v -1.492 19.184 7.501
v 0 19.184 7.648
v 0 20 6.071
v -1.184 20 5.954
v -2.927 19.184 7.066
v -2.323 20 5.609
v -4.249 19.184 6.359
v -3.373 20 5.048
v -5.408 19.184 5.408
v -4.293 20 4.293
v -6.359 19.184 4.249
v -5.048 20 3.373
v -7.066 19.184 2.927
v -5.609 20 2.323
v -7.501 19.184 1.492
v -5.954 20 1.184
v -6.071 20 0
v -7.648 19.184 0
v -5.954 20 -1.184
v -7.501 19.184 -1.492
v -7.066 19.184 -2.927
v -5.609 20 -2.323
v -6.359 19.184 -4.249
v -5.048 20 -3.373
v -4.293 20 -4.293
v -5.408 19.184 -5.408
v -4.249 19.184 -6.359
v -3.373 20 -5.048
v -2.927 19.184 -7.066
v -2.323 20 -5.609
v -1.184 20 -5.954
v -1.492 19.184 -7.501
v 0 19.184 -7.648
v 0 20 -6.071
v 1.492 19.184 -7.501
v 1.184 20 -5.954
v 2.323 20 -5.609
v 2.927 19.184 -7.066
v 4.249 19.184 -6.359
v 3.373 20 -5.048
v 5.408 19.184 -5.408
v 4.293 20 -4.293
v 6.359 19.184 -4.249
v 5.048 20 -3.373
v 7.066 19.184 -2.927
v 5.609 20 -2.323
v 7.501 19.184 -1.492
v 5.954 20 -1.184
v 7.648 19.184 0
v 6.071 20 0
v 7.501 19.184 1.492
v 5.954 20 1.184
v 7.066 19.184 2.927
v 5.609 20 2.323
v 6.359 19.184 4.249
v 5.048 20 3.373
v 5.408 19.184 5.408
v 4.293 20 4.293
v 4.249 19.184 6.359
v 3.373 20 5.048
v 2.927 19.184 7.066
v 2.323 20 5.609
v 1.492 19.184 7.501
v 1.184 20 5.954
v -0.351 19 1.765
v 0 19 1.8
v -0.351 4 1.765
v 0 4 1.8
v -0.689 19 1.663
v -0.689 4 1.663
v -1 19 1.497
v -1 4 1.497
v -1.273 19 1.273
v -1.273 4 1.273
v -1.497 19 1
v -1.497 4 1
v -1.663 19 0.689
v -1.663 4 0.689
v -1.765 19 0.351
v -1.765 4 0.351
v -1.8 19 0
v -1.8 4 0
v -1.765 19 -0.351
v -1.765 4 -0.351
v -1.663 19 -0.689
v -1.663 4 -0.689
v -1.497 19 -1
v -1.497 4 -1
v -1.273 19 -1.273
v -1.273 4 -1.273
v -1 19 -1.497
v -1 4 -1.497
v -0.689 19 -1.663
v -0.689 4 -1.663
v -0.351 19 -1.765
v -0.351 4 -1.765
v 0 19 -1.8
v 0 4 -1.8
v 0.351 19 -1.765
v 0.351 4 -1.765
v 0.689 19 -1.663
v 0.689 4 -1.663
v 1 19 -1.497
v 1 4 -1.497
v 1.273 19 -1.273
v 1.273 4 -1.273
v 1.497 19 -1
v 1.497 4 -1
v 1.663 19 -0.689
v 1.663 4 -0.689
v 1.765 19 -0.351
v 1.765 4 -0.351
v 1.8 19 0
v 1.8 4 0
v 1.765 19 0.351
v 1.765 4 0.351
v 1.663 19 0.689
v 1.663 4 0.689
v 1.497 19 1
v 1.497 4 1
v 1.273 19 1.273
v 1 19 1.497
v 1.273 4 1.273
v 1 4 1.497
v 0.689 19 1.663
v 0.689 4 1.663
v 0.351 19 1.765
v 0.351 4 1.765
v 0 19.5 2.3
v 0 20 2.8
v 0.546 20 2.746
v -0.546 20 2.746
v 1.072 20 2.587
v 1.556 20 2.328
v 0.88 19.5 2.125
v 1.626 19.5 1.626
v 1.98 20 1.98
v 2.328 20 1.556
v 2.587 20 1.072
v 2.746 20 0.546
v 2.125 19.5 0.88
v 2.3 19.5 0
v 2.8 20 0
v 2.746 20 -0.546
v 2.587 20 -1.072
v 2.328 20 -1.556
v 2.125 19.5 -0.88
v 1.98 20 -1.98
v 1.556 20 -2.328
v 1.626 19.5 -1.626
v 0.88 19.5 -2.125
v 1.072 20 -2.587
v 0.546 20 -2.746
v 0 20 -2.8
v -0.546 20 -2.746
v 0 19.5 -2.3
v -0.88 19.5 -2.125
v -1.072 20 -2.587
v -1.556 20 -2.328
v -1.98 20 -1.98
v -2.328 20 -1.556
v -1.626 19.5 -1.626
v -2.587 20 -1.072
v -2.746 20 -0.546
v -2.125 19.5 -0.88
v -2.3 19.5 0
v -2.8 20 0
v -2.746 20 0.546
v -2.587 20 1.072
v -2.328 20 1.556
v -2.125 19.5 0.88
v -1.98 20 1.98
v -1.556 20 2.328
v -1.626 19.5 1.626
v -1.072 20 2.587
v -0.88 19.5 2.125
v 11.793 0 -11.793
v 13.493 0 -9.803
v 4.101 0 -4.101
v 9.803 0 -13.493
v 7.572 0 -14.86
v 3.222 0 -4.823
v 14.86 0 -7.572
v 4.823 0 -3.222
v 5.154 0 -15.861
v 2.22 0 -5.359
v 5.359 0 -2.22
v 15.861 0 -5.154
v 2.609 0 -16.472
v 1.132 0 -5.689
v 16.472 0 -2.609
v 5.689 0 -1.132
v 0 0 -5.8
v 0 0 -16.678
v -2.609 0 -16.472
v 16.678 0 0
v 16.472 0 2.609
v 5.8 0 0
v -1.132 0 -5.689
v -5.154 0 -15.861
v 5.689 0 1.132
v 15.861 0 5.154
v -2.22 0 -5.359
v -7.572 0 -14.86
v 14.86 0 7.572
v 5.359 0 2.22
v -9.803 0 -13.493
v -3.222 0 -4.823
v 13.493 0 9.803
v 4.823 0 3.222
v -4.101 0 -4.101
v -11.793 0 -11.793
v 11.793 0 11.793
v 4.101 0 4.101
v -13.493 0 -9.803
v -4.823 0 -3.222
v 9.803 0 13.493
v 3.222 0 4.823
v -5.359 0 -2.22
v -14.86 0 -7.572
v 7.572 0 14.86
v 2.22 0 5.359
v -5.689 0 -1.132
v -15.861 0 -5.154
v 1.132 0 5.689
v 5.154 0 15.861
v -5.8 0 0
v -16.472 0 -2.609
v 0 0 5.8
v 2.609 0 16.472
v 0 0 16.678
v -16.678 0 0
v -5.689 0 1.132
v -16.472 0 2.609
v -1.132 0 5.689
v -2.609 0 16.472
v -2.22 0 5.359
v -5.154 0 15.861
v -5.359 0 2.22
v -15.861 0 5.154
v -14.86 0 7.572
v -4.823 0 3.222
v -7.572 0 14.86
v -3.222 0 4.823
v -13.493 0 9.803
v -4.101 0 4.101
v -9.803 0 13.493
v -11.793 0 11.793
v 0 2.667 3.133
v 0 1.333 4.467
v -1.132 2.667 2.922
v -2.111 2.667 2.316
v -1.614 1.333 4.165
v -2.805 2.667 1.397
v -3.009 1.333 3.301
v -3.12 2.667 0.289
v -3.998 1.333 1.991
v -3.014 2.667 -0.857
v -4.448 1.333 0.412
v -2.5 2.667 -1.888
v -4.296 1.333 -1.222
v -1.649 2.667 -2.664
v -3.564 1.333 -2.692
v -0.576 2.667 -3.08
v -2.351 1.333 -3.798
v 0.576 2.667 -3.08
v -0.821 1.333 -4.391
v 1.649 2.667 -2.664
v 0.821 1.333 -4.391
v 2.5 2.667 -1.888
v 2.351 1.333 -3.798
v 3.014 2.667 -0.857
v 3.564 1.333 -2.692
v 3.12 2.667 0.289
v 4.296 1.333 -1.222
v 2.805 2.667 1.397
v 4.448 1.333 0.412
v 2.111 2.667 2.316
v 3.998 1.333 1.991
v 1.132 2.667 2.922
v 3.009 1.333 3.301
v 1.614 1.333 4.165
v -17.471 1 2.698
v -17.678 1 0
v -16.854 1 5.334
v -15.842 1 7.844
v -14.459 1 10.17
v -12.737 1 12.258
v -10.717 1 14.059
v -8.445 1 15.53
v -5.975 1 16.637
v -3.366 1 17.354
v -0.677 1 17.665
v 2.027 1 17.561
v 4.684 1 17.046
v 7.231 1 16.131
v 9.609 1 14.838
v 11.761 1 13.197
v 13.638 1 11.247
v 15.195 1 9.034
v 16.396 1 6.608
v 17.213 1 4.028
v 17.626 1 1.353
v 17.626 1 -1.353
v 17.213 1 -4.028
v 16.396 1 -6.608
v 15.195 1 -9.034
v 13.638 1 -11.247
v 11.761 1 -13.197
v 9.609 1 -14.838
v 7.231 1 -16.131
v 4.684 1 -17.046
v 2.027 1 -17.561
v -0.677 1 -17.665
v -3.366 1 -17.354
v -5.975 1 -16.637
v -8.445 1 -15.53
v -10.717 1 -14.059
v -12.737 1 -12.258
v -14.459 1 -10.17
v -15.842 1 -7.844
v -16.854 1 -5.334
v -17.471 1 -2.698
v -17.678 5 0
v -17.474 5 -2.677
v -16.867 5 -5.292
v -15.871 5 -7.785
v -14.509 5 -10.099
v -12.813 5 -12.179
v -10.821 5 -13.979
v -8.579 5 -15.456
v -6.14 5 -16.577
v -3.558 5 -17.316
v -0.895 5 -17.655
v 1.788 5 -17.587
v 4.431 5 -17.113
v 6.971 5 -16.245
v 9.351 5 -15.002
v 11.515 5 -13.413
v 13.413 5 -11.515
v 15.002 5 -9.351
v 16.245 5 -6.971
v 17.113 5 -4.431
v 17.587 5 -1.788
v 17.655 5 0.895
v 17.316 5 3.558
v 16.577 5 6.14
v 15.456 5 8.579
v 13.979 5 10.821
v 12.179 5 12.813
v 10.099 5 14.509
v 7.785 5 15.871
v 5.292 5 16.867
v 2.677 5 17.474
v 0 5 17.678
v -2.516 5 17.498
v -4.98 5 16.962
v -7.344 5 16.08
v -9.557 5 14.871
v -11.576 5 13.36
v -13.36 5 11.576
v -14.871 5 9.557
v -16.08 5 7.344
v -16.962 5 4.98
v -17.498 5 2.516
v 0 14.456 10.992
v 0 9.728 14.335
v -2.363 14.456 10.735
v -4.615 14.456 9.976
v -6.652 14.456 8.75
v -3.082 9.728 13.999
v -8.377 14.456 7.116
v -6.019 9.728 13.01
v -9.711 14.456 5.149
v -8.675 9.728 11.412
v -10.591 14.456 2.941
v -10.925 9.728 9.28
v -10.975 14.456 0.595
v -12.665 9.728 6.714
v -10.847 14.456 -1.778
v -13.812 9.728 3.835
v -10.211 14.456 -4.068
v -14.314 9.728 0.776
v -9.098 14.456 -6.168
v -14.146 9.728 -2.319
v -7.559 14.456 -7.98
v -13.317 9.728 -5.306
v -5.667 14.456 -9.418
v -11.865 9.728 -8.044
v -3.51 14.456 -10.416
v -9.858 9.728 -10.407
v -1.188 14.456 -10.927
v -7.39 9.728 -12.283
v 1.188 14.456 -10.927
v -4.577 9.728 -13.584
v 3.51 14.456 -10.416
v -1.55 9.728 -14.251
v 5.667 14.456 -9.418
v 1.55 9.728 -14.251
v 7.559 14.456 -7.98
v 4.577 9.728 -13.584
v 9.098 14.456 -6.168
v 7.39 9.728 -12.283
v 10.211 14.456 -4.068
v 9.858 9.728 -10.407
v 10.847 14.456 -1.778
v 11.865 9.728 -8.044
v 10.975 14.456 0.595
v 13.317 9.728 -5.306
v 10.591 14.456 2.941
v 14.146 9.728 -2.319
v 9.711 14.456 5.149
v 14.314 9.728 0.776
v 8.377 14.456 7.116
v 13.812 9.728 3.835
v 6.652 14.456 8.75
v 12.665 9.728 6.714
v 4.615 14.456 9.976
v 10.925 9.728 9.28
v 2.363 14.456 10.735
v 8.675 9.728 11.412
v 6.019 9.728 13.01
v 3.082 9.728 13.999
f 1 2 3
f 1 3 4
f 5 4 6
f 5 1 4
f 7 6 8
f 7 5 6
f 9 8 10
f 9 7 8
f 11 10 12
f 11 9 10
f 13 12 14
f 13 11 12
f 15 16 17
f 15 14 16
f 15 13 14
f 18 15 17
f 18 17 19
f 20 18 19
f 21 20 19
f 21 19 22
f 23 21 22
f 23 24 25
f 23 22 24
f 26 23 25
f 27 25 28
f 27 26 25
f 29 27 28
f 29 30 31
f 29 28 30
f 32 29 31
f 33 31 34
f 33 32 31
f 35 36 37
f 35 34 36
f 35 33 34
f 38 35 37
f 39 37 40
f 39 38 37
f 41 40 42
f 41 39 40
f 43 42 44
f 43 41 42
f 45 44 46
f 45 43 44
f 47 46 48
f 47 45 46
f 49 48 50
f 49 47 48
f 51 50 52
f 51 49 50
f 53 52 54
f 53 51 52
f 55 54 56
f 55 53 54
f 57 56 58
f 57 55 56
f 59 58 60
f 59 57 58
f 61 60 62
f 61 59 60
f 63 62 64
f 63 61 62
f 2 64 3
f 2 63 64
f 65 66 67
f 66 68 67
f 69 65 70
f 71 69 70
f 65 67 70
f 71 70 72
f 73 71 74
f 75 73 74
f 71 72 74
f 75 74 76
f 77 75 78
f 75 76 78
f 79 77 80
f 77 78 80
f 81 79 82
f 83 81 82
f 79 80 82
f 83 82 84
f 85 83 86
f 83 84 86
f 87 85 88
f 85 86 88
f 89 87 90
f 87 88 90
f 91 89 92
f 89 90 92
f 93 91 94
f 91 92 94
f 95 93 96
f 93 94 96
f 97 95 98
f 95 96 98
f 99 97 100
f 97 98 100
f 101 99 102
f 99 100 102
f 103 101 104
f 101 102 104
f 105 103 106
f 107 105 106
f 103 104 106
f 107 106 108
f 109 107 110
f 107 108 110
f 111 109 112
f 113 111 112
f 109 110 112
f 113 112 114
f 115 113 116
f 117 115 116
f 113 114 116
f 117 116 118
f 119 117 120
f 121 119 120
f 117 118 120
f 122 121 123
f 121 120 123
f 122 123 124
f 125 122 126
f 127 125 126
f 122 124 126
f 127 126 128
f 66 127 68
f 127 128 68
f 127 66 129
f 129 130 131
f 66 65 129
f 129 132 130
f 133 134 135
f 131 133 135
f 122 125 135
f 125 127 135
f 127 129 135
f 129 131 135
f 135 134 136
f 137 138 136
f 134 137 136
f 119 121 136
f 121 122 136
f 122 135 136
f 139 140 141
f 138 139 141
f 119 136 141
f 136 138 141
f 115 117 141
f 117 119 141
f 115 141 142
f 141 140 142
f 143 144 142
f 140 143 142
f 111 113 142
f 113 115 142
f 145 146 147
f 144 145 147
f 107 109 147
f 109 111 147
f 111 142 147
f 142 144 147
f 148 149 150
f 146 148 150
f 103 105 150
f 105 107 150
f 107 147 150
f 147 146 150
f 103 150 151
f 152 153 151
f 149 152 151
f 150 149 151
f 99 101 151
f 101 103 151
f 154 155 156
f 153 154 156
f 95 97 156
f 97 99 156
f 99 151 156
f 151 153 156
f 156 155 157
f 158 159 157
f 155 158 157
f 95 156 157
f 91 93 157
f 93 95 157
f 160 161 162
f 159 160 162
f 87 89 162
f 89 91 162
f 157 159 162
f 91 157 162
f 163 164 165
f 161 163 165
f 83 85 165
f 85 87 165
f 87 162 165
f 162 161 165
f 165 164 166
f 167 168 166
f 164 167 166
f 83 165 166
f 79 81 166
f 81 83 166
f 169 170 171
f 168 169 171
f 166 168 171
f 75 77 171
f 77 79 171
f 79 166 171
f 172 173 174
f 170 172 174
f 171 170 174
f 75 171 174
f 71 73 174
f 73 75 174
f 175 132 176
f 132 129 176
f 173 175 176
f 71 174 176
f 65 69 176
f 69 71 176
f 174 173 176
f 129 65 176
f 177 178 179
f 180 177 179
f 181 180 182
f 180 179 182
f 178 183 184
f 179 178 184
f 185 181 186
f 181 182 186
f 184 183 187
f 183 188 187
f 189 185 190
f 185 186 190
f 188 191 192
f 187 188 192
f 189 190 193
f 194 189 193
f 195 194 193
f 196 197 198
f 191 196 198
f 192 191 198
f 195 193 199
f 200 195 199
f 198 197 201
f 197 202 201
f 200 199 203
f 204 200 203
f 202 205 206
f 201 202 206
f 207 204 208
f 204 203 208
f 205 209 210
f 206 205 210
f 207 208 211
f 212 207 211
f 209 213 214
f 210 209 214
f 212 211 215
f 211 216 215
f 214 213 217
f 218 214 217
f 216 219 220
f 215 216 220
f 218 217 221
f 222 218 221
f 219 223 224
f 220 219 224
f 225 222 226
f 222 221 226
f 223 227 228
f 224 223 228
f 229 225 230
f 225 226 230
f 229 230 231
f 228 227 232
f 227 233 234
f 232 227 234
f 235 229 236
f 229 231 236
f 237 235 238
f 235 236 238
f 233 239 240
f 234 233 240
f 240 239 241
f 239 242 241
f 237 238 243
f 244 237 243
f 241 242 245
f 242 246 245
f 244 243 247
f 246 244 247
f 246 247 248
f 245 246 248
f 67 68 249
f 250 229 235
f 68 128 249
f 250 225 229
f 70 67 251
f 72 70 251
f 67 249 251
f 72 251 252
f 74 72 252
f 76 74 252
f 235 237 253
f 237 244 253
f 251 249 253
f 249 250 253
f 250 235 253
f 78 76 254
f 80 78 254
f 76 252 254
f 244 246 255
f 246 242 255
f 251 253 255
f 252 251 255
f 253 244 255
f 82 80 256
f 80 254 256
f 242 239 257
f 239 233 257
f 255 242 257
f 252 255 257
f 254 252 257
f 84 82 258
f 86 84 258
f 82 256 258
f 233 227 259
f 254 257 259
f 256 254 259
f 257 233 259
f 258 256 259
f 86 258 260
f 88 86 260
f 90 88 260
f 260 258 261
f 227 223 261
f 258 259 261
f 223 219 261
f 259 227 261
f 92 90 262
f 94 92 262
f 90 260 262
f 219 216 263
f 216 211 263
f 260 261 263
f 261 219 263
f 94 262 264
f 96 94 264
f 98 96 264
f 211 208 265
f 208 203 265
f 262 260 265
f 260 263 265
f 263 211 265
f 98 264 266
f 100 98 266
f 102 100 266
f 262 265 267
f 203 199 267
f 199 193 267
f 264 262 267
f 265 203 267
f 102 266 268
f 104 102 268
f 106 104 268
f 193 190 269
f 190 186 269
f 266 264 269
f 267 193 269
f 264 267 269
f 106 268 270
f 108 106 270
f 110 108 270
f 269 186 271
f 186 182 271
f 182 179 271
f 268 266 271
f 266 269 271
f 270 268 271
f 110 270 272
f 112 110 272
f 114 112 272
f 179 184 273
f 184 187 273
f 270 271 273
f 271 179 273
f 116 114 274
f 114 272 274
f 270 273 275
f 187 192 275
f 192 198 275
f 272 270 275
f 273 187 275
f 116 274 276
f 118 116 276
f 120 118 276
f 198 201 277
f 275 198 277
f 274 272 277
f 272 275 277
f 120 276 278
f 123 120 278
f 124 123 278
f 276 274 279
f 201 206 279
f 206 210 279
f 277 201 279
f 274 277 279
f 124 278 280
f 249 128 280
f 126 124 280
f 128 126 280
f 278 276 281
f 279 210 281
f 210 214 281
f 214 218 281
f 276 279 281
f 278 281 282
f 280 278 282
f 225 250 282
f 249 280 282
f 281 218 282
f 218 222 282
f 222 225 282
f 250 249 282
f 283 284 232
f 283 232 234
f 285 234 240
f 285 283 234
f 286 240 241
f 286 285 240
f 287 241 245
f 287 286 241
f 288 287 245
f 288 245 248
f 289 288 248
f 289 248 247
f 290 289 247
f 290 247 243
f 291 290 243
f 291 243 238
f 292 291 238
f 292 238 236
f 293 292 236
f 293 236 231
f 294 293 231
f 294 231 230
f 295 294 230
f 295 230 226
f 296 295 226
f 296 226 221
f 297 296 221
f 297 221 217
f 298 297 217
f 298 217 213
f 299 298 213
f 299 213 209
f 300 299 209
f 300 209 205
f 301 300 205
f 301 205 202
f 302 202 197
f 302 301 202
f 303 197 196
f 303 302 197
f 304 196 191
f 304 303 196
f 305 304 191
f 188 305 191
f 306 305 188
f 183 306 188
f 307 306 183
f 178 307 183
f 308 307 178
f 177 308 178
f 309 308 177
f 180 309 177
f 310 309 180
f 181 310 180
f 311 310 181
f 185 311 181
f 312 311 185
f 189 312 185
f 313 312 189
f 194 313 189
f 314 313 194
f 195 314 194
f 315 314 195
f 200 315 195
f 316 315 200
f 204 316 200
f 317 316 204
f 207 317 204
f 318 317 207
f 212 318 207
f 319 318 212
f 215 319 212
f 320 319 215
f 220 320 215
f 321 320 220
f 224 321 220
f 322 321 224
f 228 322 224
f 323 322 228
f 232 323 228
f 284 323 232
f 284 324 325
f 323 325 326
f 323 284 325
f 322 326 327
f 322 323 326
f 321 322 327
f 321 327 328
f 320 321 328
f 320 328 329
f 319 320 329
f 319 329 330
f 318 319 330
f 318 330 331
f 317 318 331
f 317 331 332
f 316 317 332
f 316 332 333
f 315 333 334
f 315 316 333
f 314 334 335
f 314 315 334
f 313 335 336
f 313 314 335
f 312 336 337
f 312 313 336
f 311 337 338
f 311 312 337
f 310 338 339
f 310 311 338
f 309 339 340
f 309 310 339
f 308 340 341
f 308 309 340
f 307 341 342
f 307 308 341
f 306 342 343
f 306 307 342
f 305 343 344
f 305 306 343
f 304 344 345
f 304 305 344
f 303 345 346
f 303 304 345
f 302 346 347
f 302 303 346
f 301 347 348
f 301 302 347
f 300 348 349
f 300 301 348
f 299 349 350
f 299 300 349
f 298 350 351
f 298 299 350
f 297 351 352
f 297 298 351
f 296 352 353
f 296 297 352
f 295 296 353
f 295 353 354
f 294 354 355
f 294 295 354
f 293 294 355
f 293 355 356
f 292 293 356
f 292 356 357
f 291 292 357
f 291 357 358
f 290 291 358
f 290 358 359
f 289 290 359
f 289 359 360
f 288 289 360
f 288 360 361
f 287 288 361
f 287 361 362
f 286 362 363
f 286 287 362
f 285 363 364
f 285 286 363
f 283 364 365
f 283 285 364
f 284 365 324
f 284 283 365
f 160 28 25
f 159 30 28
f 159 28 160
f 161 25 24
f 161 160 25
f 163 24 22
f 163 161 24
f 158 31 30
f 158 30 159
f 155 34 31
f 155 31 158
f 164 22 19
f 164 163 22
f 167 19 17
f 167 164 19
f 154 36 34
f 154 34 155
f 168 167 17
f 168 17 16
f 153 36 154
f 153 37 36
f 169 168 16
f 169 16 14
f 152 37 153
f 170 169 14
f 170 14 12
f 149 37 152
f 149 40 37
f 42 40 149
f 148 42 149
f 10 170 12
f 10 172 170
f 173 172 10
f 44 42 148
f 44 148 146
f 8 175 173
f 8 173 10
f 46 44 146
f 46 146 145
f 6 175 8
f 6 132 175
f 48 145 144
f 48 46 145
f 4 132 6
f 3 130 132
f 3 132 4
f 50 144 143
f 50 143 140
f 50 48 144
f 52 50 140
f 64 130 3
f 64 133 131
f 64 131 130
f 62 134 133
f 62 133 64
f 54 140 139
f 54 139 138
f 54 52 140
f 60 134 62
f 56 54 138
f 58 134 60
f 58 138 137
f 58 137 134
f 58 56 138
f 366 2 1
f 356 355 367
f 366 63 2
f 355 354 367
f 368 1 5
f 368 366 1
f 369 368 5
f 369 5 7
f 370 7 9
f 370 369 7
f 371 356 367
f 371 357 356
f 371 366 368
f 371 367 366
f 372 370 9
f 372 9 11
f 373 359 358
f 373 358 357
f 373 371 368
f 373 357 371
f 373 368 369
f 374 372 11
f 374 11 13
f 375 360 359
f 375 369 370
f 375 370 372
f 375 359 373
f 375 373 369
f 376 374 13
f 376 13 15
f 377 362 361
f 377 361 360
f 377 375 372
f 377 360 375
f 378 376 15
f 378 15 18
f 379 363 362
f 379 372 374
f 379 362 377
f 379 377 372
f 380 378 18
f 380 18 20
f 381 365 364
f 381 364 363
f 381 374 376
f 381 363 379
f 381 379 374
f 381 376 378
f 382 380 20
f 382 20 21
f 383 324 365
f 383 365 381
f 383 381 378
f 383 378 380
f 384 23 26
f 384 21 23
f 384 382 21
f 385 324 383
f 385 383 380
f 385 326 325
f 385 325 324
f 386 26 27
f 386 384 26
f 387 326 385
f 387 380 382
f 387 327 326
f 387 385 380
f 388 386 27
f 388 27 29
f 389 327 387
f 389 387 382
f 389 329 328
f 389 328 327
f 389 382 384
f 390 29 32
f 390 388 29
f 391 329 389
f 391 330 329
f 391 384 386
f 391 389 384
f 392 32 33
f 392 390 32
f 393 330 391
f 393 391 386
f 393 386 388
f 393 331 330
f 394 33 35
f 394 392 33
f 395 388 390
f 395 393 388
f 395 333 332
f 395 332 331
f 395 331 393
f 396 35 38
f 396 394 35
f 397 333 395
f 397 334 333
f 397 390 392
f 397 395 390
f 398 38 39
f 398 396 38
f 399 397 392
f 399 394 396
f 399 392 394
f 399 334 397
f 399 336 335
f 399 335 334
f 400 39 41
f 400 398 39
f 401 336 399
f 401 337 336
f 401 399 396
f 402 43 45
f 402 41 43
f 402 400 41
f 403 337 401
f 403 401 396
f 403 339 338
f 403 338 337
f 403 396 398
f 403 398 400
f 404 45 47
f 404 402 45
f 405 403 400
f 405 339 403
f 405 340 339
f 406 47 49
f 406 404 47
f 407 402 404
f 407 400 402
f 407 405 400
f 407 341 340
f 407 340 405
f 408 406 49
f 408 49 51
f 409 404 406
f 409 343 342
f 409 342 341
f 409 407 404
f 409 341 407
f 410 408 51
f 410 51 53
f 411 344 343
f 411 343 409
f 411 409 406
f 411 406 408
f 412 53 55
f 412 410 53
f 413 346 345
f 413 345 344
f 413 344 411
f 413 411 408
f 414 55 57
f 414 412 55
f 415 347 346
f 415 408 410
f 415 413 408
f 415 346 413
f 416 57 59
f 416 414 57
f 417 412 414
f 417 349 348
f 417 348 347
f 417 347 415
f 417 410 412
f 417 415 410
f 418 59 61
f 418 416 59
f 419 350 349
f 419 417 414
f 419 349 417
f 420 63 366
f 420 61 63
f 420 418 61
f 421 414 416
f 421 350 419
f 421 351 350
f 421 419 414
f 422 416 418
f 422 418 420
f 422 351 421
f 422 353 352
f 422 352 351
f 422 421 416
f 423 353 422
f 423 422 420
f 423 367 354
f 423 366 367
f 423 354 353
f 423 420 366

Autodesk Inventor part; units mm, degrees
ref_plane "YZ Plane" through (0, 0, 0) normal (1, 0, 0) x (0, 1, 0)
ref_plane "XZ Plane" through (0, 0, 0) normal (0, 1, 0) x (-1, 0, 0)
ref_plane "XY Plane" through (0, 0, 0) normal (0, 0, 1) x (1, 0, 0)
sketch "Boceto1" plane through (0, 0, 0) normal (0, 1, 0) x (-1, 0, 0)
  line L0 (-12.5, -12.5) -> (12.5, -12.5) construction
  line L1 (12.5, -12.5) -> (12.5, 12.5) construction
  line L2 (12.5, 12.5) -> (-12.5, 12.5) construction
  line L3 (-12.5, 12.5) -> (-12.5, -12.5) construction
  line L4 (-12.5, -12.5) -> (12.5, 12.5) construction
  line L5 (12.5, -12.5) -> (-12.5, 12.5) construction
  circle A0 centre (0, 0) radius 17.6777
  dimension "d0" = 25
  dimension "d1" = 25
extrude "Extrusión1" add sketch "Boceto1" along normal blind 5
sketch "Boceto2" plane through (0, 0, 0) normal (1, 0, 0) x (0, 1, 0)
  line L0 (5, -17.6777) -> (5, 17.6777) construction
  line L1 (5, 0) -> (30, 0)
  line L2 (30, 0) -> (5, 17.6777)
  line L3 (20, 0) -> (20, 7.0711)
  line L4 (5, 0) -> (5, 17.6777)
  line L5 (-6, 0) -> (36, 0) projected
  point P0 (0, 0)
  dimension "d4" = 25
  dimension "d5" = 15
revolve "Revolución1" add sketch "Boceto2" angle 360 about axis through (0, -10, 0) along (0, 1, 0) contours L4 L2 L3 L1
sketch "Boceto3" plane through (0, 20, 0) normal (0, 1, 0) x (1, 0, 0)
  point P0 (0, 0)
  point P1 (0, 0)
hole "Agujero1" at (0, 20, 0) direction (0, -1, 0) diameter 3.6 end through all
sketch "Boceto4" plane through (0, 0, 0) normal (0, -1, 0) x (1, 0, 0)
  point P0 (0, 0)
chamfer "Chaflán1" distance 4 angle 45 1 edges at (0, 0, -1.8)
chamfer "Chaflán2" distance 1 angle 45 2 edges at (17.6777, 0, 0) (0, 20, -7.0711)
chamfer "Chaflán3" distance 1 angle 45 1 edges at (0, 20, -1.8)
properties part number "PesaGrua"
